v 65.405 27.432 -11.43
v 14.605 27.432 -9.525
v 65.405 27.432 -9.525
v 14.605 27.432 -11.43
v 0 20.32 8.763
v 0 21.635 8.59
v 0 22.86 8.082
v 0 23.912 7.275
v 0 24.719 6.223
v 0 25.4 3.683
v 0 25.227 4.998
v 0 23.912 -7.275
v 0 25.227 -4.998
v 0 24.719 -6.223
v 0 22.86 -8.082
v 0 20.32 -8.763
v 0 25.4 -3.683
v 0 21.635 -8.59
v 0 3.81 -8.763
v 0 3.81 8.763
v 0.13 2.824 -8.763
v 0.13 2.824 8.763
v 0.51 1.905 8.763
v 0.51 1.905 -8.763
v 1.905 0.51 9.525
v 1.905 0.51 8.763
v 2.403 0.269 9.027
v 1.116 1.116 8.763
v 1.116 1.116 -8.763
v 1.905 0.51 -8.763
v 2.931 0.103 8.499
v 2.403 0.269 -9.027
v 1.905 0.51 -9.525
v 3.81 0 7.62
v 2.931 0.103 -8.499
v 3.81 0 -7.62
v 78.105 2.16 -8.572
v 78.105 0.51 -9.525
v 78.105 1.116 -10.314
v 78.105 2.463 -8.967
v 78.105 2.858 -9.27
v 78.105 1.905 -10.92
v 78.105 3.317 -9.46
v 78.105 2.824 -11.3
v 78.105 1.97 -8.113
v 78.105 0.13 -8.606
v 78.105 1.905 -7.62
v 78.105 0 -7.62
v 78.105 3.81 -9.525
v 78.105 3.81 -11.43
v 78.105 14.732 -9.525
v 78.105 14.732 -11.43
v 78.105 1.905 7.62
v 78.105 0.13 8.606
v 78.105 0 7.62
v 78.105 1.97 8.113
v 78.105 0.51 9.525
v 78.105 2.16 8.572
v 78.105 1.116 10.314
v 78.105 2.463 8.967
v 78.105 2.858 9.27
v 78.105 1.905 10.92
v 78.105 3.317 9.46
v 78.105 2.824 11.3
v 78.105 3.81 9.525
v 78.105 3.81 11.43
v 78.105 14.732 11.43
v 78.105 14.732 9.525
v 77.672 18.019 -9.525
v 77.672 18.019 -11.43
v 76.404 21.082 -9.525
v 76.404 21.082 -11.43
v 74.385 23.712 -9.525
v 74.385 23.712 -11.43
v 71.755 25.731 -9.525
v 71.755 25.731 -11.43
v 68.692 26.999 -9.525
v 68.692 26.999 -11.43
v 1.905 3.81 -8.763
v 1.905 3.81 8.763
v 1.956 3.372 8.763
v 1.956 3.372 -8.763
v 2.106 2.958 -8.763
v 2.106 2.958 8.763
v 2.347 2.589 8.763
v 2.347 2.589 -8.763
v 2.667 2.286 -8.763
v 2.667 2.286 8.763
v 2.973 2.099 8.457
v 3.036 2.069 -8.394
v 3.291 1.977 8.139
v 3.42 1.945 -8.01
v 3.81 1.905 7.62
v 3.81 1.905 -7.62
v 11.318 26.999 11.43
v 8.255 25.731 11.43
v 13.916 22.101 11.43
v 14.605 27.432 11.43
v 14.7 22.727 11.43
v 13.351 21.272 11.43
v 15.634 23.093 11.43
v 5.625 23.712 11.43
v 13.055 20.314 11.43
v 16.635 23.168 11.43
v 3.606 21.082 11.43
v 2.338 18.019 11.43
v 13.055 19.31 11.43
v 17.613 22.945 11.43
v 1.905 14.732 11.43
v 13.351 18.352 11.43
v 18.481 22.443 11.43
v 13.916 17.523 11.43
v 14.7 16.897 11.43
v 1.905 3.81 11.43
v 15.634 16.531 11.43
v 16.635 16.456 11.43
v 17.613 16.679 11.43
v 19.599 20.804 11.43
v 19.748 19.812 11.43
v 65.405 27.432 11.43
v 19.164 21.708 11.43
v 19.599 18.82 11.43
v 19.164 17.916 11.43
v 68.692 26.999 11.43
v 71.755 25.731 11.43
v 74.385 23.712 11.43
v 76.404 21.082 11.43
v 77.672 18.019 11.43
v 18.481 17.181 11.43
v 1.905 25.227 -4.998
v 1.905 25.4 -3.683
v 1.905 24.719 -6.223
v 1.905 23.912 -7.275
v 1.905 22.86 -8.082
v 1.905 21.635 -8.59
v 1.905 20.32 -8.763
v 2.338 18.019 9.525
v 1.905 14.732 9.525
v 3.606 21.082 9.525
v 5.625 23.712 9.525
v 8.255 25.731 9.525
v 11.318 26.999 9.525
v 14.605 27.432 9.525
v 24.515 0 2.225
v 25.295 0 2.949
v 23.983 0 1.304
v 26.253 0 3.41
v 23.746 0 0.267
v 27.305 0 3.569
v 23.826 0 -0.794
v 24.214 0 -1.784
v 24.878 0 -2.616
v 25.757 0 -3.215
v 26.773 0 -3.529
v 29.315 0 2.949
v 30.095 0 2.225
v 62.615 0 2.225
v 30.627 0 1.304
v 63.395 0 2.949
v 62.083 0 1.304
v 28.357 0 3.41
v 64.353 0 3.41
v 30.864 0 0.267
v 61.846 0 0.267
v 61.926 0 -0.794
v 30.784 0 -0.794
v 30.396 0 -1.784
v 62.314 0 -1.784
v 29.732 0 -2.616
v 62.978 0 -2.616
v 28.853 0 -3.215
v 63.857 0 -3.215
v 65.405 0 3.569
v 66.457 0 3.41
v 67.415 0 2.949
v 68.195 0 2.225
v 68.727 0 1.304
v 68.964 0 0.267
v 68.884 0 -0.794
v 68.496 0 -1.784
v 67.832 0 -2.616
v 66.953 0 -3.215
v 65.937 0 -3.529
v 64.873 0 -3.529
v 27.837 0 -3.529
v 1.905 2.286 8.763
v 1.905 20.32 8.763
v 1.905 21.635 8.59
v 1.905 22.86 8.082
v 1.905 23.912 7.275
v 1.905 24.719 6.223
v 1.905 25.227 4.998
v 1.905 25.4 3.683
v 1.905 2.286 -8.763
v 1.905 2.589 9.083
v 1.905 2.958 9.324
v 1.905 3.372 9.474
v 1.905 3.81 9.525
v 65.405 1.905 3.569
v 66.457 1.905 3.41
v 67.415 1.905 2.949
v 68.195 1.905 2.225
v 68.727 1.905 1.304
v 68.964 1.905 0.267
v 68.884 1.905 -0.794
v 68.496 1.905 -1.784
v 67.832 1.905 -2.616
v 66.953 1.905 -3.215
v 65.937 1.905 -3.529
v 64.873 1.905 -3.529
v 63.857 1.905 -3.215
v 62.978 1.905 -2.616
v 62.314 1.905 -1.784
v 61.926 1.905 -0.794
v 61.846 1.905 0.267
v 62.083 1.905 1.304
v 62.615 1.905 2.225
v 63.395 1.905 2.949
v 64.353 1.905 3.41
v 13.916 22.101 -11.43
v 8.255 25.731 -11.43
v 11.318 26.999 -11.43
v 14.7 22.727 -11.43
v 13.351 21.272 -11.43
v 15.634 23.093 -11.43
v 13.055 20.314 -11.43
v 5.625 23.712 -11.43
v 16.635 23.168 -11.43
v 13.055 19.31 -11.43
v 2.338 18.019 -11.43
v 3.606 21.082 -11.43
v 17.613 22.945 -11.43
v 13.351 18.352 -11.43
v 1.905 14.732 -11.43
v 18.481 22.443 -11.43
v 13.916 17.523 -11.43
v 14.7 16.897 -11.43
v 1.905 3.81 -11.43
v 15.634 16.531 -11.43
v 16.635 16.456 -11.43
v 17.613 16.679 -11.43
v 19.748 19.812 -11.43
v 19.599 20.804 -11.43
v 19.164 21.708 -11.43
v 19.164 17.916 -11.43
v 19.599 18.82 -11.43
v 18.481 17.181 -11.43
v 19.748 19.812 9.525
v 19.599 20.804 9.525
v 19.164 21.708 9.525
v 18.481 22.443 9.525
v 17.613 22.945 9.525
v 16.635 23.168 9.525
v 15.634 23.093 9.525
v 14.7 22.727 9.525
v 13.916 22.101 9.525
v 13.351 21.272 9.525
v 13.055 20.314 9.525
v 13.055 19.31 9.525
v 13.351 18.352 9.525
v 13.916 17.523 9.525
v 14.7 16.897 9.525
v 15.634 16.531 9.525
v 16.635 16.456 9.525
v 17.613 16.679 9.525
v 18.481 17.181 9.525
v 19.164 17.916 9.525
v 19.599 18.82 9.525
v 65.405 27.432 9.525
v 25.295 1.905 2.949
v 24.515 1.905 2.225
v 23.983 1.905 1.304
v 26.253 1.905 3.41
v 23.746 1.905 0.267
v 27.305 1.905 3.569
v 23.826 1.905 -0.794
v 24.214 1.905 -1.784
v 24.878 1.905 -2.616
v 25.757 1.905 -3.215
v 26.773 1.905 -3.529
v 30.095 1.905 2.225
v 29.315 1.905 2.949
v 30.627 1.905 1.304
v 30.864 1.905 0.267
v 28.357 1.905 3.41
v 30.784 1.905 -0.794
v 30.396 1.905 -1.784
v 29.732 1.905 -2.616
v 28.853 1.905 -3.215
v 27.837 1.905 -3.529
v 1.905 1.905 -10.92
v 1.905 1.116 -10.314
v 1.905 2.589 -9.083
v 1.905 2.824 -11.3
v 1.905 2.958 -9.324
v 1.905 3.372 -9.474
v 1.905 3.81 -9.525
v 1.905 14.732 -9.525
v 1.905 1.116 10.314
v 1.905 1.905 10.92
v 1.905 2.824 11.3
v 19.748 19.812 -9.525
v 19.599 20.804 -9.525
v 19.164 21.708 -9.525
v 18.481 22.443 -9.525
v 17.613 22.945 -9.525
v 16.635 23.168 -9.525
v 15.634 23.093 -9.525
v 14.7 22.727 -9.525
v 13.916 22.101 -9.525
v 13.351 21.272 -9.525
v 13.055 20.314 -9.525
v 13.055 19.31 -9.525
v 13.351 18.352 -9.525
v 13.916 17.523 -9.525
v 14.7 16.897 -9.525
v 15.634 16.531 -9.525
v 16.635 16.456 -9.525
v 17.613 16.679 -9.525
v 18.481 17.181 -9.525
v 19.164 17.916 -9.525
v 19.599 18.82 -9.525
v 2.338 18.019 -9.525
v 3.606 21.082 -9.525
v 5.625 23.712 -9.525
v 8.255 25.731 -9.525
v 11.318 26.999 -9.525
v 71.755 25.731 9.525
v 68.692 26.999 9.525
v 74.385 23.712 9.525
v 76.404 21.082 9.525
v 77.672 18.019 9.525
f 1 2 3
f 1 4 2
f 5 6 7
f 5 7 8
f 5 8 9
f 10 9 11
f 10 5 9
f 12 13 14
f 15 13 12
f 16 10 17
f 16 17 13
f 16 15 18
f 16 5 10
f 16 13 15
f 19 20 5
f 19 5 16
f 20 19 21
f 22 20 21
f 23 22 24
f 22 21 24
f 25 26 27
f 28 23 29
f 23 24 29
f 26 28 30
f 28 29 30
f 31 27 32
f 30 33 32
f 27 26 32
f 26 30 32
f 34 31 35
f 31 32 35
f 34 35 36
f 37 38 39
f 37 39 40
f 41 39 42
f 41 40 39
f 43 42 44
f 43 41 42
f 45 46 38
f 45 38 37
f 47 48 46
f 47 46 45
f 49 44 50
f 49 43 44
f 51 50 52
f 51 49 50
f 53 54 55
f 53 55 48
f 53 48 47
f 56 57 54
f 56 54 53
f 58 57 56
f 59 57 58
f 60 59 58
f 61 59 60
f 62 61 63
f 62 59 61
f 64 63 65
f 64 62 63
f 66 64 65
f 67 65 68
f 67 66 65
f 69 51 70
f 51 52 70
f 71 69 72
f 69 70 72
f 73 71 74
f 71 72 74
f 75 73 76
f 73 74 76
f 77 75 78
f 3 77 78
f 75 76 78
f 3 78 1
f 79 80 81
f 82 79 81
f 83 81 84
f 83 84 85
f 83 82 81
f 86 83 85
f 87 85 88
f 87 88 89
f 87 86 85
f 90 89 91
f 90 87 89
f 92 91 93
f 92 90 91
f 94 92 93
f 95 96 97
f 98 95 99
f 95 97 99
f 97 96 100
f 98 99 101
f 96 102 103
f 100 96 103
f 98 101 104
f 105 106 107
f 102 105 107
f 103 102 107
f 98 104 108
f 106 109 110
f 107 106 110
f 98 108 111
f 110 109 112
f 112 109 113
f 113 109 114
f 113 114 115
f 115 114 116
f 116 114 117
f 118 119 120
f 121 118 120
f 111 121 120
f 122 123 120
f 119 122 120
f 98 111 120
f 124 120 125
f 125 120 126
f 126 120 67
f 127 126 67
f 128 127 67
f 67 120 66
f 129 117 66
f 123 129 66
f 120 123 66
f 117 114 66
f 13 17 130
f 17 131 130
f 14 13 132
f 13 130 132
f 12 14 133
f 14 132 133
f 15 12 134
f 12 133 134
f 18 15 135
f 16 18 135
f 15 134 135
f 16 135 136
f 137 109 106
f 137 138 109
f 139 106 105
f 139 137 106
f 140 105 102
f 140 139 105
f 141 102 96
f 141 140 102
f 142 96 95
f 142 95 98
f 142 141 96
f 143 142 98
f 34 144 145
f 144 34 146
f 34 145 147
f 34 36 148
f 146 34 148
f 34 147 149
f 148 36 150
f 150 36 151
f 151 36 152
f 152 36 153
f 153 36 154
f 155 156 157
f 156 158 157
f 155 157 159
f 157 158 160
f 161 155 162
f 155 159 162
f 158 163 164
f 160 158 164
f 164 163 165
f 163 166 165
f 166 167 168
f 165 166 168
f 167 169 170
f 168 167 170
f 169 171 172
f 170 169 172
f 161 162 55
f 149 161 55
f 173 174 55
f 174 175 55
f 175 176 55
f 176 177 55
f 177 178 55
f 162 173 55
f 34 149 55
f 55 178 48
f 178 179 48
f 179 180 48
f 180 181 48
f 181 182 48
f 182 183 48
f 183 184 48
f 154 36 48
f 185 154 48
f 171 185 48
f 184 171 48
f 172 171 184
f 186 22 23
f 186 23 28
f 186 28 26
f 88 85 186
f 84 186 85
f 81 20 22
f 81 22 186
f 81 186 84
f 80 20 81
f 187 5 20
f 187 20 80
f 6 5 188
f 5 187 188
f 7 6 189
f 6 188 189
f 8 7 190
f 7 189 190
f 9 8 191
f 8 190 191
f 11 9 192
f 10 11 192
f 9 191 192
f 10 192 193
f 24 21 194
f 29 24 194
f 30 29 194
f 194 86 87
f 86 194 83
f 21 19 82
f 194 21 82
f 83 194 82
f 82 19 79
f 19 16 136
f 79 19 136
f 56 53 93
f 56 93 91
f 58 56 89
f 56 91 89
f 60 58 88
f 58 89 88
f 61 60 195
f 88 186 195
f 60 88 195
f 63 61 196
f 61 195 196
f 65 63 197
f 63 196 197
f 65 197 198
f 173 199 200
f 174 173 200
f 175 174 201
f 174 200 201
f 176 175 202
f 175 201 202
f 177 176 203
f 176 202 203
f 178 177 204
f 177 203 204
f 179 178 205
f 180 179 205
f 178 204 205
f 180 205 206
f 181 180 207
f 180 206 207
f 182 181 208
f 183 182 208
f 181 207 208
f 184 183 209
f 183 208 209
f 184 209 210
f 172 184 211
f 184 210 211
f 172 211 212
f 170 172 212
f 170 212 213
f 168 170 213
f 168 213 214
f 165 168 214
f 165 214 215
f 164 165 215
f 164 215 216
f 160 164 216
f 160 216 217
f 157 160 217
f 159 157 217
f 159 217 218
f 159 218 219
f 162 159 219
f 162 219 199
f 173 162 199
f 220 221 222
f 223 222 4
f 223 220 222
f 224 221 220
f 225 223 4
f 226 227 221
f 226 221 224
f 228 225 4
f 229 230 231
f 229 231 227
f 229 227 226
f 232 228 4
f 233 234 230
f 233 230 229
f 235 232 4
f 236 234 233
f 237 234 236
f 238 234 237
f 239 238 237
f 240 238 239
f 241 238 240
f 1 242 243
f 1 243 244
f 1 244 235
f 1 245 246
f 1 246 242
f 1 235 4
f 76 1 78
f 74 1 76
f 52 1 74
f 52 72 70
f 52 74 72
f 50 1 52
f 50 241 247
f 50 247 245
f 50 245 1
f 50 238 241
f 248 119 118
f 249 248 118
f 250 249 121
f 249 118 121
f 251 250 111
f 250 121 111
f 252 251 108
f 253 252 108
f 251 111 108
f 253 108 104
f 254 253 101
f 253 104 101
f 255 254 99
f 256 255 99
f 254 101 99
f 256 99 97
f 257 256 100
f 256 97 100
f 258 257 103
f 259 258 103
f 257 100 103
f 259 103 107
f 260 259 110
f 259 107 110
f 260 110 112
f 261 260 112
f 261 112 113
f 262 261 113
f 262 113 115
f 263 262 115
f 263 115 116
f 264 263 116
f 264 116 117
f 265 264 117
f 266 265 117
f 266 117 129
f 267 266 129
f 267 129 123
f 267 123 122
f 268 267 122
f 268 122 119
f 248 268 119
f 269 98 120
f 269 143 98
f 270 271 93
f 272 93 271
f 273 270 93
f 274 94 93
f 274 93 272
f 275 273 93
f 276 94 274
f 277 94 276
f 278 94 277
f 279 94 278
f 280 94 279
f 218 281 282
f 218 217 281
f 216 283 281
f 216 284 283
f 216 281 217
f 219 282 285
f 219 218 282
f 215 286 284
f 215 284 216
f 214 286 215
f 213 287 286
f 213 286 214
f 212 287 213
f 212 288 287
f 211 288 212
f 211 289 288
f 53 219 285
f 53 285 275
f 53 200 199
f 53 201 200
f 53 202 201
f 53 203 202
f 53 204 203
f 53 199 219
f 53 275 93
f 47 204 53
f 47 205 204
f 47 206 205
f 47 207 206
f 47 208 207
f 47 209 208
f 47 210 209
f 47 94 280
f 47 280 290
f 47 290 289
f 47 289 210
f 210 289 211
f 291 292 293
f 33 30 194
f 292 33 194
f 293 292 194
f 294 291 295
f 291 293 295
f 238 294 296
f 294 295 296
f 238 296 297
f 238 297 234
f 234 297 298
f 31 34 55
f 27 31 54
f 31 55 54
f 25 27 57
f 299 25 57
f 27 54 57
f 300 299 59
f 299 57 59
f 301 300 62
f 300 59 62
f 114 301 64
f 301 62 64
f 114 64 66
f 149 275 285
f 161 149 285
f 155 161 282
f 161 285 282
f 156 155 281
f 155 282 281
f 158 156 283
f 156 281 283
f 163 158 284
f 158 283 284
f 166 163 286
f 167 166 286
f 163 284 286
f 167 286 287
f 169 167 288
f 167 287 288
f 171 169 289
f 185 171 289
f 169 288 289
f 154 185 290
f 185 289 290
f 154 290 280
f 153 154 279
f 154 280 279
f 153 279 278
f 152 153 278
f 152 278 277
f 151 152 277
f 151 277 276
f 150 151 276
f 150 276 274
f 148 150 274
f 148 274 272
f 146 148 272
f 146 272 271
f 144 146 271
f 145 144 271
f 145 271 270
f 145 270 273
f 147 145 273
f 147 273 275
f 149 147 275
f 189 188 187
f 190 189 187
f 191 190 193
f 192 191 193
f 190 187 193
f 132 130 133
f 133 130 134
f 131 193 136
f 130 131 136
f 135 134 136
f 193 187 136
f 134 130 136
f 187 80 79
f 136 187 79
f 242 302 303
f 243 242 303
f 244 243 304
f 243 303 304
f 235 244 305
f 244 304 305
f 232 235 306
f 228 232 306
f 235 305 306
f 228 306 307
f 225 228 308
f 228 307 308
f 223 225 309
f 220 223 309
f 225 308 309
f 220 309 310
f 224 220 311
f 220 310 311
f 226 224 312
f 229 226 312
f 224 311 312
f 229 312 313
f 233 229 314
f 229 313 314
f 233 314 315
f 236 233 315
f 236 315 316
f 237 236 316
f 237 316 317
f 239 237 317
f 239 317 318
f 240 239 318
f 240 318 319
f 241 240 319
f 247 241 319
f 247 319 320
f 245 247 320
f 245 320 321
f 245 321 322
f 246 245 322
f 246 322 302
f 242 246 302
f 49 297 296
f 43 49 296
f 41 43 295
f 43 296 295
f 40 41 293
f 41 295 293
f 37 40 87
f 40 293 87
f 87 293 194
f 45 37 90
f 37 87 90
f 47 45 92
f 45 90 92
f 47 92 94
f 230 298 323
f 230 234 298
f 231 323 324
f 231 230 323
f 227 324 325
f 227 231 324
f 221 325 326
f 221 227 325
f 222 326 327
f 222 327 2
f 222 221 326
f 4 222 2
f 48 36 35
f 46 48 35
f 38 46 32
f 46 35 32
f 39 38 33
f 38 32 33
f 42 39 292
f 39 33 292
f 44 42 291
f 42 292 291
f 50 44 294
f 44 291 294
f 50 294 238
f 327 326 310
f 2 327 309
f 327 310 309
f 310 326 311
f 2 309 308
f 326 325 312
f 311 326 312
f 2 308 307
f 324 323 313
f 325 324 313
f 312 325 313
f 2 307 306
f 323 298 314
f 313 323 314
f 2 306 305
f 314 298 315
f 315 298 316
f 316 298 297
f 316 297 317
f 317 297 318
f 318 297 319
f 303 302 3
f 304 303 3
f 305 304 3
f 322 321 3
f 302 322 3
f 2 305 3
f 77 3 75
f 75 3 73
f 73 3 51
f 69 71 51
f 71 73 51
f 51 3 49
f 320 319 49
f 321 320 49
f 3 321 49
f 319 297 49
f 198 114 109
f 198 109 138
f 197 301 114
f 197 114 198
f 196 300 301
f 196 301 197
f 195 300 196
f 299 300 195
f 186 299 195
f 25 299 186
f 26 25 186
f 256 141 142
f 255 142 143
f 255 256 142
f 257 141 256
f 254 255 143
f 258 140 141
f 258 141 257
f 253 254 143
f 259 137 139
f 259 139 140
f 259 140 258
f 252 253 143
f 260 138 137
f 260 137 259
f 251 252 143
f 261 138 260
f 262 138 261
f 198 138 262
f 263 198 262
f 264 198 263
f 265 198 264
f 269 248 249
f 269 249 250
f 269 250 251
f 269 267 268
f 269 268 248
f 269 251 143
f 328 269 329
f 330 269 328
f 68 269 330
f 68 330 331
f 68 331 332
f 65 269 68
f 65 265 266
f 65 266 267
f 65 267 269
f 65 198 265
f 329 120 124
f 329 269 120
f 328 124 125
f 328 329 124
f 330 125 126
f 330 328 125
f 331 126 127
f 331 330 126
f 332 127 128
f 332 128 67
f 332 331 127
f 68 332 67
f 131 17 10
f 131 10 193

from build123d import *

# Parameters (mm, degrees)
SKETCH1_W           = 78.105
SKETCH1_H           = 22.86
BOSS_EXTRUDE1_DEPTH = 1.905
SKETCH2_W           = 76.2
SKETCH2_H           = 1.905
BOSS_EXTRUDE2_DEPTH = 25.527
SKETCH5_W           = 1.905
SKETCH5_H           = 17.526
BOSS_EXTRUDE6_DEPTH = 23.495
SKETCH6_W           = 1.905
SKETCH6_H           = 2.667
CUT_EXTRUDE2_DEPTH  = 25.4
SKETCH7_R           = 3.5687
CUT_EXTRUDE3_DEPTH  = 25.4
SKETCH8_R           = 3.3655
CUT_EXTRUDE4_DEPTH  = 25.4
FILLET1_R           = 12.7
FILLET2_R           = 5.08
FILLET3_R           = 3.81
FILLET4_R           = 1.905
FILLET5_R           = 3.81
FILLET6_START       = 1.905
FILLET6_DEPTH       = 76.2


with BuildPart() as part:
    # Sketch1 → Boss-Extrude1 (new body)
    with BuildSketch(Plane(origin=(0, 0, 0), x_dir=(1, 0, 0), z_dir=(0, 1, 0))):
        with Locations((39.0525, 0)):
            Rectangle(SKETCH1_W, SKETCH1_H)
    extrude(amount=BOSS_EXTRUDE1_DEPTH)

    # Sketch2 → Boss-Extrude2 (add)
    with BuildSketch(Plane(origin=(0, 1.905, 0), x_dir=(1, 0, 0), z_dir=(0, 1, 0))):
        with Locations((40.005, -10.4775)):
            Rectangle(SKETCH2_W, SKETCH2_H)
        with Locations((40.005, 10.4775)):
            Rectangle(SKETCH2_W, SKETCH2_H)
    extrude(amount=BOSS_EXTRUDE2_DEPTH)

    # Sketch5 → Boss-Extrude6 (add)
    with BuildSketch(Plane(origin=(0, 1.905, 0), x_dir=(1, 0, 0), z_dir=(0, 1, 0))):
        with Locations((0.9525, 0)):
            Rectangle(SKETCH5_W, SKETCH5_H)
    extrude(amount=BOSS_EXTRUDE6_DEPTH)

    # Sketch6 → Cut-Extrude2 (cut)
    with BuildSketch(Plane(origin=(0, 1.905, 0), x_dir=(1, 0, 0), z_dir=(0, 1, 0))):
        with Locations((0.9525, -10.0965)):
            Rectangle(SKETCH6_W, SKETCH6_H)
        with Locations((0.9525, 10.0965)):
            Rectangle(SKETCH6_W, SKETCH6_H)
    extrude(amount=-CUT_EXTRUDE2_DEPTH, mode=Mode.SUBTRACT)

    # Sketch7 → Cut-Extrude3 (cut)
    with BuildSketch(Plane(origin=(0, 1.905, 0), x_dir=(1, 0, 0), z_dir=(0, 1, 0))):
        with Locations(Location((65.405, 0, 0), (0, 0, 270))):
            Circle(SKETCH7_R)
        with Locations(Location((27.305, 0, 0), (0, 0, 270))):
            Circle(SKETCH7_R)
    extrude(amount=-CUT_EXTRUDE3_DEPTH, mode=Mode.SUBTRACT)

    # Sketch8 → Cut-Extrude4 (cut)
    with BuildSketch(Plane.XY.offset(11.43)):
        with Locations((16.383, 19.812)):
            Circle(SKETCH8_R)
    extrude(amount=-CUT_EXTRUDE4_DEPTH, mode=Mode.SUBTRACT)

    # Fillet1
    fillet1_edges = [part.edges().sort_by_distance(p)[0] for p in [
        (78.105, 27.432, 10.4775),
        (1.905, 27.432, 10.4775),
        (1.905, 27.432, -10.4775),
        (78.105, 27.432, -10.4775),
    ]]
    fillet(fillet1_edges, radius=FILLET1_R)

    # Fillet2
    fillet2_edges = [part.edges().sort_by_distance(p)[0] for p in [
        (0.9525, 25.4, -8.763),
        (0.9525, 25.4, 8.763),
    ]]
    fillet(fillet2_edges, radius=FILLET2_R)

    # Fillet3
    fillet3_edges = [part.edges().sort_by_distance(p)[0] for p in [
        (0, 0, 0),
    ]]
    fillet(fillet3_edges, radius=FILLET3_R)

    # Fillet4
    fillet4_edges = [part.edges().sort_by_distance(p)[0] for p in [
        (1.905, 1.905, 0),
    ]]
    fillet(fillet4_edges, radius=FILLET4_R)

    # Fillet5
    # the kernel refuses this fillet: 3.81 mm, written as the material it takes off along each edge
    with BuildSketch(Plane(origin=(-5.715, 0, -11.43), x_dir=(0, 0, 1), z_dir=(1, 0, 0))) as fillet5_piece_1:
        with BuildLine():
            CenterArc((FILLET5_R, -FILLET5_R), FILLET5_R, 90, 90)
            Line((0, -FILLET5_R), (0, 0))
            Line((0, 0), (FILLET5_R, 0))
        make_face()
    extrude(amount=93.345, mode=Mode.SUBTRACT)
    with BuildSketch(Plane(origin=(87.63, 0, 11.43), x_dir=(0, 1, 0), z_dir=(-1, 0, 0))) as fillet5_piece_2:
        with BuildLine():
            CenterArc((FILLET5_R, FILLET5_R), FILLET5_R, 180, 90)
            Line((0, FILLET5_R), (0, 0))
            Line((0, 0), (FILLET5_R, 0))
        make_face()
    extrude(amount=93.345, mode=Mode.SUBTRACT)

    # Fillet6: read off the stored shape, not the designer's step
    # Fillet6 outline → Fillet6 (add)
    with BuildSketch(Plane.YZ.offset(FILLET6_START)):
        with BuildLine():
            Line((1.905, -7.62), (1.905, -9.525))
            Line((1.905, -9.525), (3.81, -9.525))
            ThreePointArc((3.81, -9.525), (2.462961582, -8.967038418), (1.905, -7.62))
        make_face()
        with BuildLine():
            Line((3.81, 9.525), (1.905, 9.525))
            Line((1.905, 9.525), (1.905, 7.62))
            ThreePointArc((1.905, 7.62), (2.462961582, 8.967038418), (3.81, 9.525))
        make_face()
    extrude(amount=FILLET6_DEPTH)


solid = part.part
